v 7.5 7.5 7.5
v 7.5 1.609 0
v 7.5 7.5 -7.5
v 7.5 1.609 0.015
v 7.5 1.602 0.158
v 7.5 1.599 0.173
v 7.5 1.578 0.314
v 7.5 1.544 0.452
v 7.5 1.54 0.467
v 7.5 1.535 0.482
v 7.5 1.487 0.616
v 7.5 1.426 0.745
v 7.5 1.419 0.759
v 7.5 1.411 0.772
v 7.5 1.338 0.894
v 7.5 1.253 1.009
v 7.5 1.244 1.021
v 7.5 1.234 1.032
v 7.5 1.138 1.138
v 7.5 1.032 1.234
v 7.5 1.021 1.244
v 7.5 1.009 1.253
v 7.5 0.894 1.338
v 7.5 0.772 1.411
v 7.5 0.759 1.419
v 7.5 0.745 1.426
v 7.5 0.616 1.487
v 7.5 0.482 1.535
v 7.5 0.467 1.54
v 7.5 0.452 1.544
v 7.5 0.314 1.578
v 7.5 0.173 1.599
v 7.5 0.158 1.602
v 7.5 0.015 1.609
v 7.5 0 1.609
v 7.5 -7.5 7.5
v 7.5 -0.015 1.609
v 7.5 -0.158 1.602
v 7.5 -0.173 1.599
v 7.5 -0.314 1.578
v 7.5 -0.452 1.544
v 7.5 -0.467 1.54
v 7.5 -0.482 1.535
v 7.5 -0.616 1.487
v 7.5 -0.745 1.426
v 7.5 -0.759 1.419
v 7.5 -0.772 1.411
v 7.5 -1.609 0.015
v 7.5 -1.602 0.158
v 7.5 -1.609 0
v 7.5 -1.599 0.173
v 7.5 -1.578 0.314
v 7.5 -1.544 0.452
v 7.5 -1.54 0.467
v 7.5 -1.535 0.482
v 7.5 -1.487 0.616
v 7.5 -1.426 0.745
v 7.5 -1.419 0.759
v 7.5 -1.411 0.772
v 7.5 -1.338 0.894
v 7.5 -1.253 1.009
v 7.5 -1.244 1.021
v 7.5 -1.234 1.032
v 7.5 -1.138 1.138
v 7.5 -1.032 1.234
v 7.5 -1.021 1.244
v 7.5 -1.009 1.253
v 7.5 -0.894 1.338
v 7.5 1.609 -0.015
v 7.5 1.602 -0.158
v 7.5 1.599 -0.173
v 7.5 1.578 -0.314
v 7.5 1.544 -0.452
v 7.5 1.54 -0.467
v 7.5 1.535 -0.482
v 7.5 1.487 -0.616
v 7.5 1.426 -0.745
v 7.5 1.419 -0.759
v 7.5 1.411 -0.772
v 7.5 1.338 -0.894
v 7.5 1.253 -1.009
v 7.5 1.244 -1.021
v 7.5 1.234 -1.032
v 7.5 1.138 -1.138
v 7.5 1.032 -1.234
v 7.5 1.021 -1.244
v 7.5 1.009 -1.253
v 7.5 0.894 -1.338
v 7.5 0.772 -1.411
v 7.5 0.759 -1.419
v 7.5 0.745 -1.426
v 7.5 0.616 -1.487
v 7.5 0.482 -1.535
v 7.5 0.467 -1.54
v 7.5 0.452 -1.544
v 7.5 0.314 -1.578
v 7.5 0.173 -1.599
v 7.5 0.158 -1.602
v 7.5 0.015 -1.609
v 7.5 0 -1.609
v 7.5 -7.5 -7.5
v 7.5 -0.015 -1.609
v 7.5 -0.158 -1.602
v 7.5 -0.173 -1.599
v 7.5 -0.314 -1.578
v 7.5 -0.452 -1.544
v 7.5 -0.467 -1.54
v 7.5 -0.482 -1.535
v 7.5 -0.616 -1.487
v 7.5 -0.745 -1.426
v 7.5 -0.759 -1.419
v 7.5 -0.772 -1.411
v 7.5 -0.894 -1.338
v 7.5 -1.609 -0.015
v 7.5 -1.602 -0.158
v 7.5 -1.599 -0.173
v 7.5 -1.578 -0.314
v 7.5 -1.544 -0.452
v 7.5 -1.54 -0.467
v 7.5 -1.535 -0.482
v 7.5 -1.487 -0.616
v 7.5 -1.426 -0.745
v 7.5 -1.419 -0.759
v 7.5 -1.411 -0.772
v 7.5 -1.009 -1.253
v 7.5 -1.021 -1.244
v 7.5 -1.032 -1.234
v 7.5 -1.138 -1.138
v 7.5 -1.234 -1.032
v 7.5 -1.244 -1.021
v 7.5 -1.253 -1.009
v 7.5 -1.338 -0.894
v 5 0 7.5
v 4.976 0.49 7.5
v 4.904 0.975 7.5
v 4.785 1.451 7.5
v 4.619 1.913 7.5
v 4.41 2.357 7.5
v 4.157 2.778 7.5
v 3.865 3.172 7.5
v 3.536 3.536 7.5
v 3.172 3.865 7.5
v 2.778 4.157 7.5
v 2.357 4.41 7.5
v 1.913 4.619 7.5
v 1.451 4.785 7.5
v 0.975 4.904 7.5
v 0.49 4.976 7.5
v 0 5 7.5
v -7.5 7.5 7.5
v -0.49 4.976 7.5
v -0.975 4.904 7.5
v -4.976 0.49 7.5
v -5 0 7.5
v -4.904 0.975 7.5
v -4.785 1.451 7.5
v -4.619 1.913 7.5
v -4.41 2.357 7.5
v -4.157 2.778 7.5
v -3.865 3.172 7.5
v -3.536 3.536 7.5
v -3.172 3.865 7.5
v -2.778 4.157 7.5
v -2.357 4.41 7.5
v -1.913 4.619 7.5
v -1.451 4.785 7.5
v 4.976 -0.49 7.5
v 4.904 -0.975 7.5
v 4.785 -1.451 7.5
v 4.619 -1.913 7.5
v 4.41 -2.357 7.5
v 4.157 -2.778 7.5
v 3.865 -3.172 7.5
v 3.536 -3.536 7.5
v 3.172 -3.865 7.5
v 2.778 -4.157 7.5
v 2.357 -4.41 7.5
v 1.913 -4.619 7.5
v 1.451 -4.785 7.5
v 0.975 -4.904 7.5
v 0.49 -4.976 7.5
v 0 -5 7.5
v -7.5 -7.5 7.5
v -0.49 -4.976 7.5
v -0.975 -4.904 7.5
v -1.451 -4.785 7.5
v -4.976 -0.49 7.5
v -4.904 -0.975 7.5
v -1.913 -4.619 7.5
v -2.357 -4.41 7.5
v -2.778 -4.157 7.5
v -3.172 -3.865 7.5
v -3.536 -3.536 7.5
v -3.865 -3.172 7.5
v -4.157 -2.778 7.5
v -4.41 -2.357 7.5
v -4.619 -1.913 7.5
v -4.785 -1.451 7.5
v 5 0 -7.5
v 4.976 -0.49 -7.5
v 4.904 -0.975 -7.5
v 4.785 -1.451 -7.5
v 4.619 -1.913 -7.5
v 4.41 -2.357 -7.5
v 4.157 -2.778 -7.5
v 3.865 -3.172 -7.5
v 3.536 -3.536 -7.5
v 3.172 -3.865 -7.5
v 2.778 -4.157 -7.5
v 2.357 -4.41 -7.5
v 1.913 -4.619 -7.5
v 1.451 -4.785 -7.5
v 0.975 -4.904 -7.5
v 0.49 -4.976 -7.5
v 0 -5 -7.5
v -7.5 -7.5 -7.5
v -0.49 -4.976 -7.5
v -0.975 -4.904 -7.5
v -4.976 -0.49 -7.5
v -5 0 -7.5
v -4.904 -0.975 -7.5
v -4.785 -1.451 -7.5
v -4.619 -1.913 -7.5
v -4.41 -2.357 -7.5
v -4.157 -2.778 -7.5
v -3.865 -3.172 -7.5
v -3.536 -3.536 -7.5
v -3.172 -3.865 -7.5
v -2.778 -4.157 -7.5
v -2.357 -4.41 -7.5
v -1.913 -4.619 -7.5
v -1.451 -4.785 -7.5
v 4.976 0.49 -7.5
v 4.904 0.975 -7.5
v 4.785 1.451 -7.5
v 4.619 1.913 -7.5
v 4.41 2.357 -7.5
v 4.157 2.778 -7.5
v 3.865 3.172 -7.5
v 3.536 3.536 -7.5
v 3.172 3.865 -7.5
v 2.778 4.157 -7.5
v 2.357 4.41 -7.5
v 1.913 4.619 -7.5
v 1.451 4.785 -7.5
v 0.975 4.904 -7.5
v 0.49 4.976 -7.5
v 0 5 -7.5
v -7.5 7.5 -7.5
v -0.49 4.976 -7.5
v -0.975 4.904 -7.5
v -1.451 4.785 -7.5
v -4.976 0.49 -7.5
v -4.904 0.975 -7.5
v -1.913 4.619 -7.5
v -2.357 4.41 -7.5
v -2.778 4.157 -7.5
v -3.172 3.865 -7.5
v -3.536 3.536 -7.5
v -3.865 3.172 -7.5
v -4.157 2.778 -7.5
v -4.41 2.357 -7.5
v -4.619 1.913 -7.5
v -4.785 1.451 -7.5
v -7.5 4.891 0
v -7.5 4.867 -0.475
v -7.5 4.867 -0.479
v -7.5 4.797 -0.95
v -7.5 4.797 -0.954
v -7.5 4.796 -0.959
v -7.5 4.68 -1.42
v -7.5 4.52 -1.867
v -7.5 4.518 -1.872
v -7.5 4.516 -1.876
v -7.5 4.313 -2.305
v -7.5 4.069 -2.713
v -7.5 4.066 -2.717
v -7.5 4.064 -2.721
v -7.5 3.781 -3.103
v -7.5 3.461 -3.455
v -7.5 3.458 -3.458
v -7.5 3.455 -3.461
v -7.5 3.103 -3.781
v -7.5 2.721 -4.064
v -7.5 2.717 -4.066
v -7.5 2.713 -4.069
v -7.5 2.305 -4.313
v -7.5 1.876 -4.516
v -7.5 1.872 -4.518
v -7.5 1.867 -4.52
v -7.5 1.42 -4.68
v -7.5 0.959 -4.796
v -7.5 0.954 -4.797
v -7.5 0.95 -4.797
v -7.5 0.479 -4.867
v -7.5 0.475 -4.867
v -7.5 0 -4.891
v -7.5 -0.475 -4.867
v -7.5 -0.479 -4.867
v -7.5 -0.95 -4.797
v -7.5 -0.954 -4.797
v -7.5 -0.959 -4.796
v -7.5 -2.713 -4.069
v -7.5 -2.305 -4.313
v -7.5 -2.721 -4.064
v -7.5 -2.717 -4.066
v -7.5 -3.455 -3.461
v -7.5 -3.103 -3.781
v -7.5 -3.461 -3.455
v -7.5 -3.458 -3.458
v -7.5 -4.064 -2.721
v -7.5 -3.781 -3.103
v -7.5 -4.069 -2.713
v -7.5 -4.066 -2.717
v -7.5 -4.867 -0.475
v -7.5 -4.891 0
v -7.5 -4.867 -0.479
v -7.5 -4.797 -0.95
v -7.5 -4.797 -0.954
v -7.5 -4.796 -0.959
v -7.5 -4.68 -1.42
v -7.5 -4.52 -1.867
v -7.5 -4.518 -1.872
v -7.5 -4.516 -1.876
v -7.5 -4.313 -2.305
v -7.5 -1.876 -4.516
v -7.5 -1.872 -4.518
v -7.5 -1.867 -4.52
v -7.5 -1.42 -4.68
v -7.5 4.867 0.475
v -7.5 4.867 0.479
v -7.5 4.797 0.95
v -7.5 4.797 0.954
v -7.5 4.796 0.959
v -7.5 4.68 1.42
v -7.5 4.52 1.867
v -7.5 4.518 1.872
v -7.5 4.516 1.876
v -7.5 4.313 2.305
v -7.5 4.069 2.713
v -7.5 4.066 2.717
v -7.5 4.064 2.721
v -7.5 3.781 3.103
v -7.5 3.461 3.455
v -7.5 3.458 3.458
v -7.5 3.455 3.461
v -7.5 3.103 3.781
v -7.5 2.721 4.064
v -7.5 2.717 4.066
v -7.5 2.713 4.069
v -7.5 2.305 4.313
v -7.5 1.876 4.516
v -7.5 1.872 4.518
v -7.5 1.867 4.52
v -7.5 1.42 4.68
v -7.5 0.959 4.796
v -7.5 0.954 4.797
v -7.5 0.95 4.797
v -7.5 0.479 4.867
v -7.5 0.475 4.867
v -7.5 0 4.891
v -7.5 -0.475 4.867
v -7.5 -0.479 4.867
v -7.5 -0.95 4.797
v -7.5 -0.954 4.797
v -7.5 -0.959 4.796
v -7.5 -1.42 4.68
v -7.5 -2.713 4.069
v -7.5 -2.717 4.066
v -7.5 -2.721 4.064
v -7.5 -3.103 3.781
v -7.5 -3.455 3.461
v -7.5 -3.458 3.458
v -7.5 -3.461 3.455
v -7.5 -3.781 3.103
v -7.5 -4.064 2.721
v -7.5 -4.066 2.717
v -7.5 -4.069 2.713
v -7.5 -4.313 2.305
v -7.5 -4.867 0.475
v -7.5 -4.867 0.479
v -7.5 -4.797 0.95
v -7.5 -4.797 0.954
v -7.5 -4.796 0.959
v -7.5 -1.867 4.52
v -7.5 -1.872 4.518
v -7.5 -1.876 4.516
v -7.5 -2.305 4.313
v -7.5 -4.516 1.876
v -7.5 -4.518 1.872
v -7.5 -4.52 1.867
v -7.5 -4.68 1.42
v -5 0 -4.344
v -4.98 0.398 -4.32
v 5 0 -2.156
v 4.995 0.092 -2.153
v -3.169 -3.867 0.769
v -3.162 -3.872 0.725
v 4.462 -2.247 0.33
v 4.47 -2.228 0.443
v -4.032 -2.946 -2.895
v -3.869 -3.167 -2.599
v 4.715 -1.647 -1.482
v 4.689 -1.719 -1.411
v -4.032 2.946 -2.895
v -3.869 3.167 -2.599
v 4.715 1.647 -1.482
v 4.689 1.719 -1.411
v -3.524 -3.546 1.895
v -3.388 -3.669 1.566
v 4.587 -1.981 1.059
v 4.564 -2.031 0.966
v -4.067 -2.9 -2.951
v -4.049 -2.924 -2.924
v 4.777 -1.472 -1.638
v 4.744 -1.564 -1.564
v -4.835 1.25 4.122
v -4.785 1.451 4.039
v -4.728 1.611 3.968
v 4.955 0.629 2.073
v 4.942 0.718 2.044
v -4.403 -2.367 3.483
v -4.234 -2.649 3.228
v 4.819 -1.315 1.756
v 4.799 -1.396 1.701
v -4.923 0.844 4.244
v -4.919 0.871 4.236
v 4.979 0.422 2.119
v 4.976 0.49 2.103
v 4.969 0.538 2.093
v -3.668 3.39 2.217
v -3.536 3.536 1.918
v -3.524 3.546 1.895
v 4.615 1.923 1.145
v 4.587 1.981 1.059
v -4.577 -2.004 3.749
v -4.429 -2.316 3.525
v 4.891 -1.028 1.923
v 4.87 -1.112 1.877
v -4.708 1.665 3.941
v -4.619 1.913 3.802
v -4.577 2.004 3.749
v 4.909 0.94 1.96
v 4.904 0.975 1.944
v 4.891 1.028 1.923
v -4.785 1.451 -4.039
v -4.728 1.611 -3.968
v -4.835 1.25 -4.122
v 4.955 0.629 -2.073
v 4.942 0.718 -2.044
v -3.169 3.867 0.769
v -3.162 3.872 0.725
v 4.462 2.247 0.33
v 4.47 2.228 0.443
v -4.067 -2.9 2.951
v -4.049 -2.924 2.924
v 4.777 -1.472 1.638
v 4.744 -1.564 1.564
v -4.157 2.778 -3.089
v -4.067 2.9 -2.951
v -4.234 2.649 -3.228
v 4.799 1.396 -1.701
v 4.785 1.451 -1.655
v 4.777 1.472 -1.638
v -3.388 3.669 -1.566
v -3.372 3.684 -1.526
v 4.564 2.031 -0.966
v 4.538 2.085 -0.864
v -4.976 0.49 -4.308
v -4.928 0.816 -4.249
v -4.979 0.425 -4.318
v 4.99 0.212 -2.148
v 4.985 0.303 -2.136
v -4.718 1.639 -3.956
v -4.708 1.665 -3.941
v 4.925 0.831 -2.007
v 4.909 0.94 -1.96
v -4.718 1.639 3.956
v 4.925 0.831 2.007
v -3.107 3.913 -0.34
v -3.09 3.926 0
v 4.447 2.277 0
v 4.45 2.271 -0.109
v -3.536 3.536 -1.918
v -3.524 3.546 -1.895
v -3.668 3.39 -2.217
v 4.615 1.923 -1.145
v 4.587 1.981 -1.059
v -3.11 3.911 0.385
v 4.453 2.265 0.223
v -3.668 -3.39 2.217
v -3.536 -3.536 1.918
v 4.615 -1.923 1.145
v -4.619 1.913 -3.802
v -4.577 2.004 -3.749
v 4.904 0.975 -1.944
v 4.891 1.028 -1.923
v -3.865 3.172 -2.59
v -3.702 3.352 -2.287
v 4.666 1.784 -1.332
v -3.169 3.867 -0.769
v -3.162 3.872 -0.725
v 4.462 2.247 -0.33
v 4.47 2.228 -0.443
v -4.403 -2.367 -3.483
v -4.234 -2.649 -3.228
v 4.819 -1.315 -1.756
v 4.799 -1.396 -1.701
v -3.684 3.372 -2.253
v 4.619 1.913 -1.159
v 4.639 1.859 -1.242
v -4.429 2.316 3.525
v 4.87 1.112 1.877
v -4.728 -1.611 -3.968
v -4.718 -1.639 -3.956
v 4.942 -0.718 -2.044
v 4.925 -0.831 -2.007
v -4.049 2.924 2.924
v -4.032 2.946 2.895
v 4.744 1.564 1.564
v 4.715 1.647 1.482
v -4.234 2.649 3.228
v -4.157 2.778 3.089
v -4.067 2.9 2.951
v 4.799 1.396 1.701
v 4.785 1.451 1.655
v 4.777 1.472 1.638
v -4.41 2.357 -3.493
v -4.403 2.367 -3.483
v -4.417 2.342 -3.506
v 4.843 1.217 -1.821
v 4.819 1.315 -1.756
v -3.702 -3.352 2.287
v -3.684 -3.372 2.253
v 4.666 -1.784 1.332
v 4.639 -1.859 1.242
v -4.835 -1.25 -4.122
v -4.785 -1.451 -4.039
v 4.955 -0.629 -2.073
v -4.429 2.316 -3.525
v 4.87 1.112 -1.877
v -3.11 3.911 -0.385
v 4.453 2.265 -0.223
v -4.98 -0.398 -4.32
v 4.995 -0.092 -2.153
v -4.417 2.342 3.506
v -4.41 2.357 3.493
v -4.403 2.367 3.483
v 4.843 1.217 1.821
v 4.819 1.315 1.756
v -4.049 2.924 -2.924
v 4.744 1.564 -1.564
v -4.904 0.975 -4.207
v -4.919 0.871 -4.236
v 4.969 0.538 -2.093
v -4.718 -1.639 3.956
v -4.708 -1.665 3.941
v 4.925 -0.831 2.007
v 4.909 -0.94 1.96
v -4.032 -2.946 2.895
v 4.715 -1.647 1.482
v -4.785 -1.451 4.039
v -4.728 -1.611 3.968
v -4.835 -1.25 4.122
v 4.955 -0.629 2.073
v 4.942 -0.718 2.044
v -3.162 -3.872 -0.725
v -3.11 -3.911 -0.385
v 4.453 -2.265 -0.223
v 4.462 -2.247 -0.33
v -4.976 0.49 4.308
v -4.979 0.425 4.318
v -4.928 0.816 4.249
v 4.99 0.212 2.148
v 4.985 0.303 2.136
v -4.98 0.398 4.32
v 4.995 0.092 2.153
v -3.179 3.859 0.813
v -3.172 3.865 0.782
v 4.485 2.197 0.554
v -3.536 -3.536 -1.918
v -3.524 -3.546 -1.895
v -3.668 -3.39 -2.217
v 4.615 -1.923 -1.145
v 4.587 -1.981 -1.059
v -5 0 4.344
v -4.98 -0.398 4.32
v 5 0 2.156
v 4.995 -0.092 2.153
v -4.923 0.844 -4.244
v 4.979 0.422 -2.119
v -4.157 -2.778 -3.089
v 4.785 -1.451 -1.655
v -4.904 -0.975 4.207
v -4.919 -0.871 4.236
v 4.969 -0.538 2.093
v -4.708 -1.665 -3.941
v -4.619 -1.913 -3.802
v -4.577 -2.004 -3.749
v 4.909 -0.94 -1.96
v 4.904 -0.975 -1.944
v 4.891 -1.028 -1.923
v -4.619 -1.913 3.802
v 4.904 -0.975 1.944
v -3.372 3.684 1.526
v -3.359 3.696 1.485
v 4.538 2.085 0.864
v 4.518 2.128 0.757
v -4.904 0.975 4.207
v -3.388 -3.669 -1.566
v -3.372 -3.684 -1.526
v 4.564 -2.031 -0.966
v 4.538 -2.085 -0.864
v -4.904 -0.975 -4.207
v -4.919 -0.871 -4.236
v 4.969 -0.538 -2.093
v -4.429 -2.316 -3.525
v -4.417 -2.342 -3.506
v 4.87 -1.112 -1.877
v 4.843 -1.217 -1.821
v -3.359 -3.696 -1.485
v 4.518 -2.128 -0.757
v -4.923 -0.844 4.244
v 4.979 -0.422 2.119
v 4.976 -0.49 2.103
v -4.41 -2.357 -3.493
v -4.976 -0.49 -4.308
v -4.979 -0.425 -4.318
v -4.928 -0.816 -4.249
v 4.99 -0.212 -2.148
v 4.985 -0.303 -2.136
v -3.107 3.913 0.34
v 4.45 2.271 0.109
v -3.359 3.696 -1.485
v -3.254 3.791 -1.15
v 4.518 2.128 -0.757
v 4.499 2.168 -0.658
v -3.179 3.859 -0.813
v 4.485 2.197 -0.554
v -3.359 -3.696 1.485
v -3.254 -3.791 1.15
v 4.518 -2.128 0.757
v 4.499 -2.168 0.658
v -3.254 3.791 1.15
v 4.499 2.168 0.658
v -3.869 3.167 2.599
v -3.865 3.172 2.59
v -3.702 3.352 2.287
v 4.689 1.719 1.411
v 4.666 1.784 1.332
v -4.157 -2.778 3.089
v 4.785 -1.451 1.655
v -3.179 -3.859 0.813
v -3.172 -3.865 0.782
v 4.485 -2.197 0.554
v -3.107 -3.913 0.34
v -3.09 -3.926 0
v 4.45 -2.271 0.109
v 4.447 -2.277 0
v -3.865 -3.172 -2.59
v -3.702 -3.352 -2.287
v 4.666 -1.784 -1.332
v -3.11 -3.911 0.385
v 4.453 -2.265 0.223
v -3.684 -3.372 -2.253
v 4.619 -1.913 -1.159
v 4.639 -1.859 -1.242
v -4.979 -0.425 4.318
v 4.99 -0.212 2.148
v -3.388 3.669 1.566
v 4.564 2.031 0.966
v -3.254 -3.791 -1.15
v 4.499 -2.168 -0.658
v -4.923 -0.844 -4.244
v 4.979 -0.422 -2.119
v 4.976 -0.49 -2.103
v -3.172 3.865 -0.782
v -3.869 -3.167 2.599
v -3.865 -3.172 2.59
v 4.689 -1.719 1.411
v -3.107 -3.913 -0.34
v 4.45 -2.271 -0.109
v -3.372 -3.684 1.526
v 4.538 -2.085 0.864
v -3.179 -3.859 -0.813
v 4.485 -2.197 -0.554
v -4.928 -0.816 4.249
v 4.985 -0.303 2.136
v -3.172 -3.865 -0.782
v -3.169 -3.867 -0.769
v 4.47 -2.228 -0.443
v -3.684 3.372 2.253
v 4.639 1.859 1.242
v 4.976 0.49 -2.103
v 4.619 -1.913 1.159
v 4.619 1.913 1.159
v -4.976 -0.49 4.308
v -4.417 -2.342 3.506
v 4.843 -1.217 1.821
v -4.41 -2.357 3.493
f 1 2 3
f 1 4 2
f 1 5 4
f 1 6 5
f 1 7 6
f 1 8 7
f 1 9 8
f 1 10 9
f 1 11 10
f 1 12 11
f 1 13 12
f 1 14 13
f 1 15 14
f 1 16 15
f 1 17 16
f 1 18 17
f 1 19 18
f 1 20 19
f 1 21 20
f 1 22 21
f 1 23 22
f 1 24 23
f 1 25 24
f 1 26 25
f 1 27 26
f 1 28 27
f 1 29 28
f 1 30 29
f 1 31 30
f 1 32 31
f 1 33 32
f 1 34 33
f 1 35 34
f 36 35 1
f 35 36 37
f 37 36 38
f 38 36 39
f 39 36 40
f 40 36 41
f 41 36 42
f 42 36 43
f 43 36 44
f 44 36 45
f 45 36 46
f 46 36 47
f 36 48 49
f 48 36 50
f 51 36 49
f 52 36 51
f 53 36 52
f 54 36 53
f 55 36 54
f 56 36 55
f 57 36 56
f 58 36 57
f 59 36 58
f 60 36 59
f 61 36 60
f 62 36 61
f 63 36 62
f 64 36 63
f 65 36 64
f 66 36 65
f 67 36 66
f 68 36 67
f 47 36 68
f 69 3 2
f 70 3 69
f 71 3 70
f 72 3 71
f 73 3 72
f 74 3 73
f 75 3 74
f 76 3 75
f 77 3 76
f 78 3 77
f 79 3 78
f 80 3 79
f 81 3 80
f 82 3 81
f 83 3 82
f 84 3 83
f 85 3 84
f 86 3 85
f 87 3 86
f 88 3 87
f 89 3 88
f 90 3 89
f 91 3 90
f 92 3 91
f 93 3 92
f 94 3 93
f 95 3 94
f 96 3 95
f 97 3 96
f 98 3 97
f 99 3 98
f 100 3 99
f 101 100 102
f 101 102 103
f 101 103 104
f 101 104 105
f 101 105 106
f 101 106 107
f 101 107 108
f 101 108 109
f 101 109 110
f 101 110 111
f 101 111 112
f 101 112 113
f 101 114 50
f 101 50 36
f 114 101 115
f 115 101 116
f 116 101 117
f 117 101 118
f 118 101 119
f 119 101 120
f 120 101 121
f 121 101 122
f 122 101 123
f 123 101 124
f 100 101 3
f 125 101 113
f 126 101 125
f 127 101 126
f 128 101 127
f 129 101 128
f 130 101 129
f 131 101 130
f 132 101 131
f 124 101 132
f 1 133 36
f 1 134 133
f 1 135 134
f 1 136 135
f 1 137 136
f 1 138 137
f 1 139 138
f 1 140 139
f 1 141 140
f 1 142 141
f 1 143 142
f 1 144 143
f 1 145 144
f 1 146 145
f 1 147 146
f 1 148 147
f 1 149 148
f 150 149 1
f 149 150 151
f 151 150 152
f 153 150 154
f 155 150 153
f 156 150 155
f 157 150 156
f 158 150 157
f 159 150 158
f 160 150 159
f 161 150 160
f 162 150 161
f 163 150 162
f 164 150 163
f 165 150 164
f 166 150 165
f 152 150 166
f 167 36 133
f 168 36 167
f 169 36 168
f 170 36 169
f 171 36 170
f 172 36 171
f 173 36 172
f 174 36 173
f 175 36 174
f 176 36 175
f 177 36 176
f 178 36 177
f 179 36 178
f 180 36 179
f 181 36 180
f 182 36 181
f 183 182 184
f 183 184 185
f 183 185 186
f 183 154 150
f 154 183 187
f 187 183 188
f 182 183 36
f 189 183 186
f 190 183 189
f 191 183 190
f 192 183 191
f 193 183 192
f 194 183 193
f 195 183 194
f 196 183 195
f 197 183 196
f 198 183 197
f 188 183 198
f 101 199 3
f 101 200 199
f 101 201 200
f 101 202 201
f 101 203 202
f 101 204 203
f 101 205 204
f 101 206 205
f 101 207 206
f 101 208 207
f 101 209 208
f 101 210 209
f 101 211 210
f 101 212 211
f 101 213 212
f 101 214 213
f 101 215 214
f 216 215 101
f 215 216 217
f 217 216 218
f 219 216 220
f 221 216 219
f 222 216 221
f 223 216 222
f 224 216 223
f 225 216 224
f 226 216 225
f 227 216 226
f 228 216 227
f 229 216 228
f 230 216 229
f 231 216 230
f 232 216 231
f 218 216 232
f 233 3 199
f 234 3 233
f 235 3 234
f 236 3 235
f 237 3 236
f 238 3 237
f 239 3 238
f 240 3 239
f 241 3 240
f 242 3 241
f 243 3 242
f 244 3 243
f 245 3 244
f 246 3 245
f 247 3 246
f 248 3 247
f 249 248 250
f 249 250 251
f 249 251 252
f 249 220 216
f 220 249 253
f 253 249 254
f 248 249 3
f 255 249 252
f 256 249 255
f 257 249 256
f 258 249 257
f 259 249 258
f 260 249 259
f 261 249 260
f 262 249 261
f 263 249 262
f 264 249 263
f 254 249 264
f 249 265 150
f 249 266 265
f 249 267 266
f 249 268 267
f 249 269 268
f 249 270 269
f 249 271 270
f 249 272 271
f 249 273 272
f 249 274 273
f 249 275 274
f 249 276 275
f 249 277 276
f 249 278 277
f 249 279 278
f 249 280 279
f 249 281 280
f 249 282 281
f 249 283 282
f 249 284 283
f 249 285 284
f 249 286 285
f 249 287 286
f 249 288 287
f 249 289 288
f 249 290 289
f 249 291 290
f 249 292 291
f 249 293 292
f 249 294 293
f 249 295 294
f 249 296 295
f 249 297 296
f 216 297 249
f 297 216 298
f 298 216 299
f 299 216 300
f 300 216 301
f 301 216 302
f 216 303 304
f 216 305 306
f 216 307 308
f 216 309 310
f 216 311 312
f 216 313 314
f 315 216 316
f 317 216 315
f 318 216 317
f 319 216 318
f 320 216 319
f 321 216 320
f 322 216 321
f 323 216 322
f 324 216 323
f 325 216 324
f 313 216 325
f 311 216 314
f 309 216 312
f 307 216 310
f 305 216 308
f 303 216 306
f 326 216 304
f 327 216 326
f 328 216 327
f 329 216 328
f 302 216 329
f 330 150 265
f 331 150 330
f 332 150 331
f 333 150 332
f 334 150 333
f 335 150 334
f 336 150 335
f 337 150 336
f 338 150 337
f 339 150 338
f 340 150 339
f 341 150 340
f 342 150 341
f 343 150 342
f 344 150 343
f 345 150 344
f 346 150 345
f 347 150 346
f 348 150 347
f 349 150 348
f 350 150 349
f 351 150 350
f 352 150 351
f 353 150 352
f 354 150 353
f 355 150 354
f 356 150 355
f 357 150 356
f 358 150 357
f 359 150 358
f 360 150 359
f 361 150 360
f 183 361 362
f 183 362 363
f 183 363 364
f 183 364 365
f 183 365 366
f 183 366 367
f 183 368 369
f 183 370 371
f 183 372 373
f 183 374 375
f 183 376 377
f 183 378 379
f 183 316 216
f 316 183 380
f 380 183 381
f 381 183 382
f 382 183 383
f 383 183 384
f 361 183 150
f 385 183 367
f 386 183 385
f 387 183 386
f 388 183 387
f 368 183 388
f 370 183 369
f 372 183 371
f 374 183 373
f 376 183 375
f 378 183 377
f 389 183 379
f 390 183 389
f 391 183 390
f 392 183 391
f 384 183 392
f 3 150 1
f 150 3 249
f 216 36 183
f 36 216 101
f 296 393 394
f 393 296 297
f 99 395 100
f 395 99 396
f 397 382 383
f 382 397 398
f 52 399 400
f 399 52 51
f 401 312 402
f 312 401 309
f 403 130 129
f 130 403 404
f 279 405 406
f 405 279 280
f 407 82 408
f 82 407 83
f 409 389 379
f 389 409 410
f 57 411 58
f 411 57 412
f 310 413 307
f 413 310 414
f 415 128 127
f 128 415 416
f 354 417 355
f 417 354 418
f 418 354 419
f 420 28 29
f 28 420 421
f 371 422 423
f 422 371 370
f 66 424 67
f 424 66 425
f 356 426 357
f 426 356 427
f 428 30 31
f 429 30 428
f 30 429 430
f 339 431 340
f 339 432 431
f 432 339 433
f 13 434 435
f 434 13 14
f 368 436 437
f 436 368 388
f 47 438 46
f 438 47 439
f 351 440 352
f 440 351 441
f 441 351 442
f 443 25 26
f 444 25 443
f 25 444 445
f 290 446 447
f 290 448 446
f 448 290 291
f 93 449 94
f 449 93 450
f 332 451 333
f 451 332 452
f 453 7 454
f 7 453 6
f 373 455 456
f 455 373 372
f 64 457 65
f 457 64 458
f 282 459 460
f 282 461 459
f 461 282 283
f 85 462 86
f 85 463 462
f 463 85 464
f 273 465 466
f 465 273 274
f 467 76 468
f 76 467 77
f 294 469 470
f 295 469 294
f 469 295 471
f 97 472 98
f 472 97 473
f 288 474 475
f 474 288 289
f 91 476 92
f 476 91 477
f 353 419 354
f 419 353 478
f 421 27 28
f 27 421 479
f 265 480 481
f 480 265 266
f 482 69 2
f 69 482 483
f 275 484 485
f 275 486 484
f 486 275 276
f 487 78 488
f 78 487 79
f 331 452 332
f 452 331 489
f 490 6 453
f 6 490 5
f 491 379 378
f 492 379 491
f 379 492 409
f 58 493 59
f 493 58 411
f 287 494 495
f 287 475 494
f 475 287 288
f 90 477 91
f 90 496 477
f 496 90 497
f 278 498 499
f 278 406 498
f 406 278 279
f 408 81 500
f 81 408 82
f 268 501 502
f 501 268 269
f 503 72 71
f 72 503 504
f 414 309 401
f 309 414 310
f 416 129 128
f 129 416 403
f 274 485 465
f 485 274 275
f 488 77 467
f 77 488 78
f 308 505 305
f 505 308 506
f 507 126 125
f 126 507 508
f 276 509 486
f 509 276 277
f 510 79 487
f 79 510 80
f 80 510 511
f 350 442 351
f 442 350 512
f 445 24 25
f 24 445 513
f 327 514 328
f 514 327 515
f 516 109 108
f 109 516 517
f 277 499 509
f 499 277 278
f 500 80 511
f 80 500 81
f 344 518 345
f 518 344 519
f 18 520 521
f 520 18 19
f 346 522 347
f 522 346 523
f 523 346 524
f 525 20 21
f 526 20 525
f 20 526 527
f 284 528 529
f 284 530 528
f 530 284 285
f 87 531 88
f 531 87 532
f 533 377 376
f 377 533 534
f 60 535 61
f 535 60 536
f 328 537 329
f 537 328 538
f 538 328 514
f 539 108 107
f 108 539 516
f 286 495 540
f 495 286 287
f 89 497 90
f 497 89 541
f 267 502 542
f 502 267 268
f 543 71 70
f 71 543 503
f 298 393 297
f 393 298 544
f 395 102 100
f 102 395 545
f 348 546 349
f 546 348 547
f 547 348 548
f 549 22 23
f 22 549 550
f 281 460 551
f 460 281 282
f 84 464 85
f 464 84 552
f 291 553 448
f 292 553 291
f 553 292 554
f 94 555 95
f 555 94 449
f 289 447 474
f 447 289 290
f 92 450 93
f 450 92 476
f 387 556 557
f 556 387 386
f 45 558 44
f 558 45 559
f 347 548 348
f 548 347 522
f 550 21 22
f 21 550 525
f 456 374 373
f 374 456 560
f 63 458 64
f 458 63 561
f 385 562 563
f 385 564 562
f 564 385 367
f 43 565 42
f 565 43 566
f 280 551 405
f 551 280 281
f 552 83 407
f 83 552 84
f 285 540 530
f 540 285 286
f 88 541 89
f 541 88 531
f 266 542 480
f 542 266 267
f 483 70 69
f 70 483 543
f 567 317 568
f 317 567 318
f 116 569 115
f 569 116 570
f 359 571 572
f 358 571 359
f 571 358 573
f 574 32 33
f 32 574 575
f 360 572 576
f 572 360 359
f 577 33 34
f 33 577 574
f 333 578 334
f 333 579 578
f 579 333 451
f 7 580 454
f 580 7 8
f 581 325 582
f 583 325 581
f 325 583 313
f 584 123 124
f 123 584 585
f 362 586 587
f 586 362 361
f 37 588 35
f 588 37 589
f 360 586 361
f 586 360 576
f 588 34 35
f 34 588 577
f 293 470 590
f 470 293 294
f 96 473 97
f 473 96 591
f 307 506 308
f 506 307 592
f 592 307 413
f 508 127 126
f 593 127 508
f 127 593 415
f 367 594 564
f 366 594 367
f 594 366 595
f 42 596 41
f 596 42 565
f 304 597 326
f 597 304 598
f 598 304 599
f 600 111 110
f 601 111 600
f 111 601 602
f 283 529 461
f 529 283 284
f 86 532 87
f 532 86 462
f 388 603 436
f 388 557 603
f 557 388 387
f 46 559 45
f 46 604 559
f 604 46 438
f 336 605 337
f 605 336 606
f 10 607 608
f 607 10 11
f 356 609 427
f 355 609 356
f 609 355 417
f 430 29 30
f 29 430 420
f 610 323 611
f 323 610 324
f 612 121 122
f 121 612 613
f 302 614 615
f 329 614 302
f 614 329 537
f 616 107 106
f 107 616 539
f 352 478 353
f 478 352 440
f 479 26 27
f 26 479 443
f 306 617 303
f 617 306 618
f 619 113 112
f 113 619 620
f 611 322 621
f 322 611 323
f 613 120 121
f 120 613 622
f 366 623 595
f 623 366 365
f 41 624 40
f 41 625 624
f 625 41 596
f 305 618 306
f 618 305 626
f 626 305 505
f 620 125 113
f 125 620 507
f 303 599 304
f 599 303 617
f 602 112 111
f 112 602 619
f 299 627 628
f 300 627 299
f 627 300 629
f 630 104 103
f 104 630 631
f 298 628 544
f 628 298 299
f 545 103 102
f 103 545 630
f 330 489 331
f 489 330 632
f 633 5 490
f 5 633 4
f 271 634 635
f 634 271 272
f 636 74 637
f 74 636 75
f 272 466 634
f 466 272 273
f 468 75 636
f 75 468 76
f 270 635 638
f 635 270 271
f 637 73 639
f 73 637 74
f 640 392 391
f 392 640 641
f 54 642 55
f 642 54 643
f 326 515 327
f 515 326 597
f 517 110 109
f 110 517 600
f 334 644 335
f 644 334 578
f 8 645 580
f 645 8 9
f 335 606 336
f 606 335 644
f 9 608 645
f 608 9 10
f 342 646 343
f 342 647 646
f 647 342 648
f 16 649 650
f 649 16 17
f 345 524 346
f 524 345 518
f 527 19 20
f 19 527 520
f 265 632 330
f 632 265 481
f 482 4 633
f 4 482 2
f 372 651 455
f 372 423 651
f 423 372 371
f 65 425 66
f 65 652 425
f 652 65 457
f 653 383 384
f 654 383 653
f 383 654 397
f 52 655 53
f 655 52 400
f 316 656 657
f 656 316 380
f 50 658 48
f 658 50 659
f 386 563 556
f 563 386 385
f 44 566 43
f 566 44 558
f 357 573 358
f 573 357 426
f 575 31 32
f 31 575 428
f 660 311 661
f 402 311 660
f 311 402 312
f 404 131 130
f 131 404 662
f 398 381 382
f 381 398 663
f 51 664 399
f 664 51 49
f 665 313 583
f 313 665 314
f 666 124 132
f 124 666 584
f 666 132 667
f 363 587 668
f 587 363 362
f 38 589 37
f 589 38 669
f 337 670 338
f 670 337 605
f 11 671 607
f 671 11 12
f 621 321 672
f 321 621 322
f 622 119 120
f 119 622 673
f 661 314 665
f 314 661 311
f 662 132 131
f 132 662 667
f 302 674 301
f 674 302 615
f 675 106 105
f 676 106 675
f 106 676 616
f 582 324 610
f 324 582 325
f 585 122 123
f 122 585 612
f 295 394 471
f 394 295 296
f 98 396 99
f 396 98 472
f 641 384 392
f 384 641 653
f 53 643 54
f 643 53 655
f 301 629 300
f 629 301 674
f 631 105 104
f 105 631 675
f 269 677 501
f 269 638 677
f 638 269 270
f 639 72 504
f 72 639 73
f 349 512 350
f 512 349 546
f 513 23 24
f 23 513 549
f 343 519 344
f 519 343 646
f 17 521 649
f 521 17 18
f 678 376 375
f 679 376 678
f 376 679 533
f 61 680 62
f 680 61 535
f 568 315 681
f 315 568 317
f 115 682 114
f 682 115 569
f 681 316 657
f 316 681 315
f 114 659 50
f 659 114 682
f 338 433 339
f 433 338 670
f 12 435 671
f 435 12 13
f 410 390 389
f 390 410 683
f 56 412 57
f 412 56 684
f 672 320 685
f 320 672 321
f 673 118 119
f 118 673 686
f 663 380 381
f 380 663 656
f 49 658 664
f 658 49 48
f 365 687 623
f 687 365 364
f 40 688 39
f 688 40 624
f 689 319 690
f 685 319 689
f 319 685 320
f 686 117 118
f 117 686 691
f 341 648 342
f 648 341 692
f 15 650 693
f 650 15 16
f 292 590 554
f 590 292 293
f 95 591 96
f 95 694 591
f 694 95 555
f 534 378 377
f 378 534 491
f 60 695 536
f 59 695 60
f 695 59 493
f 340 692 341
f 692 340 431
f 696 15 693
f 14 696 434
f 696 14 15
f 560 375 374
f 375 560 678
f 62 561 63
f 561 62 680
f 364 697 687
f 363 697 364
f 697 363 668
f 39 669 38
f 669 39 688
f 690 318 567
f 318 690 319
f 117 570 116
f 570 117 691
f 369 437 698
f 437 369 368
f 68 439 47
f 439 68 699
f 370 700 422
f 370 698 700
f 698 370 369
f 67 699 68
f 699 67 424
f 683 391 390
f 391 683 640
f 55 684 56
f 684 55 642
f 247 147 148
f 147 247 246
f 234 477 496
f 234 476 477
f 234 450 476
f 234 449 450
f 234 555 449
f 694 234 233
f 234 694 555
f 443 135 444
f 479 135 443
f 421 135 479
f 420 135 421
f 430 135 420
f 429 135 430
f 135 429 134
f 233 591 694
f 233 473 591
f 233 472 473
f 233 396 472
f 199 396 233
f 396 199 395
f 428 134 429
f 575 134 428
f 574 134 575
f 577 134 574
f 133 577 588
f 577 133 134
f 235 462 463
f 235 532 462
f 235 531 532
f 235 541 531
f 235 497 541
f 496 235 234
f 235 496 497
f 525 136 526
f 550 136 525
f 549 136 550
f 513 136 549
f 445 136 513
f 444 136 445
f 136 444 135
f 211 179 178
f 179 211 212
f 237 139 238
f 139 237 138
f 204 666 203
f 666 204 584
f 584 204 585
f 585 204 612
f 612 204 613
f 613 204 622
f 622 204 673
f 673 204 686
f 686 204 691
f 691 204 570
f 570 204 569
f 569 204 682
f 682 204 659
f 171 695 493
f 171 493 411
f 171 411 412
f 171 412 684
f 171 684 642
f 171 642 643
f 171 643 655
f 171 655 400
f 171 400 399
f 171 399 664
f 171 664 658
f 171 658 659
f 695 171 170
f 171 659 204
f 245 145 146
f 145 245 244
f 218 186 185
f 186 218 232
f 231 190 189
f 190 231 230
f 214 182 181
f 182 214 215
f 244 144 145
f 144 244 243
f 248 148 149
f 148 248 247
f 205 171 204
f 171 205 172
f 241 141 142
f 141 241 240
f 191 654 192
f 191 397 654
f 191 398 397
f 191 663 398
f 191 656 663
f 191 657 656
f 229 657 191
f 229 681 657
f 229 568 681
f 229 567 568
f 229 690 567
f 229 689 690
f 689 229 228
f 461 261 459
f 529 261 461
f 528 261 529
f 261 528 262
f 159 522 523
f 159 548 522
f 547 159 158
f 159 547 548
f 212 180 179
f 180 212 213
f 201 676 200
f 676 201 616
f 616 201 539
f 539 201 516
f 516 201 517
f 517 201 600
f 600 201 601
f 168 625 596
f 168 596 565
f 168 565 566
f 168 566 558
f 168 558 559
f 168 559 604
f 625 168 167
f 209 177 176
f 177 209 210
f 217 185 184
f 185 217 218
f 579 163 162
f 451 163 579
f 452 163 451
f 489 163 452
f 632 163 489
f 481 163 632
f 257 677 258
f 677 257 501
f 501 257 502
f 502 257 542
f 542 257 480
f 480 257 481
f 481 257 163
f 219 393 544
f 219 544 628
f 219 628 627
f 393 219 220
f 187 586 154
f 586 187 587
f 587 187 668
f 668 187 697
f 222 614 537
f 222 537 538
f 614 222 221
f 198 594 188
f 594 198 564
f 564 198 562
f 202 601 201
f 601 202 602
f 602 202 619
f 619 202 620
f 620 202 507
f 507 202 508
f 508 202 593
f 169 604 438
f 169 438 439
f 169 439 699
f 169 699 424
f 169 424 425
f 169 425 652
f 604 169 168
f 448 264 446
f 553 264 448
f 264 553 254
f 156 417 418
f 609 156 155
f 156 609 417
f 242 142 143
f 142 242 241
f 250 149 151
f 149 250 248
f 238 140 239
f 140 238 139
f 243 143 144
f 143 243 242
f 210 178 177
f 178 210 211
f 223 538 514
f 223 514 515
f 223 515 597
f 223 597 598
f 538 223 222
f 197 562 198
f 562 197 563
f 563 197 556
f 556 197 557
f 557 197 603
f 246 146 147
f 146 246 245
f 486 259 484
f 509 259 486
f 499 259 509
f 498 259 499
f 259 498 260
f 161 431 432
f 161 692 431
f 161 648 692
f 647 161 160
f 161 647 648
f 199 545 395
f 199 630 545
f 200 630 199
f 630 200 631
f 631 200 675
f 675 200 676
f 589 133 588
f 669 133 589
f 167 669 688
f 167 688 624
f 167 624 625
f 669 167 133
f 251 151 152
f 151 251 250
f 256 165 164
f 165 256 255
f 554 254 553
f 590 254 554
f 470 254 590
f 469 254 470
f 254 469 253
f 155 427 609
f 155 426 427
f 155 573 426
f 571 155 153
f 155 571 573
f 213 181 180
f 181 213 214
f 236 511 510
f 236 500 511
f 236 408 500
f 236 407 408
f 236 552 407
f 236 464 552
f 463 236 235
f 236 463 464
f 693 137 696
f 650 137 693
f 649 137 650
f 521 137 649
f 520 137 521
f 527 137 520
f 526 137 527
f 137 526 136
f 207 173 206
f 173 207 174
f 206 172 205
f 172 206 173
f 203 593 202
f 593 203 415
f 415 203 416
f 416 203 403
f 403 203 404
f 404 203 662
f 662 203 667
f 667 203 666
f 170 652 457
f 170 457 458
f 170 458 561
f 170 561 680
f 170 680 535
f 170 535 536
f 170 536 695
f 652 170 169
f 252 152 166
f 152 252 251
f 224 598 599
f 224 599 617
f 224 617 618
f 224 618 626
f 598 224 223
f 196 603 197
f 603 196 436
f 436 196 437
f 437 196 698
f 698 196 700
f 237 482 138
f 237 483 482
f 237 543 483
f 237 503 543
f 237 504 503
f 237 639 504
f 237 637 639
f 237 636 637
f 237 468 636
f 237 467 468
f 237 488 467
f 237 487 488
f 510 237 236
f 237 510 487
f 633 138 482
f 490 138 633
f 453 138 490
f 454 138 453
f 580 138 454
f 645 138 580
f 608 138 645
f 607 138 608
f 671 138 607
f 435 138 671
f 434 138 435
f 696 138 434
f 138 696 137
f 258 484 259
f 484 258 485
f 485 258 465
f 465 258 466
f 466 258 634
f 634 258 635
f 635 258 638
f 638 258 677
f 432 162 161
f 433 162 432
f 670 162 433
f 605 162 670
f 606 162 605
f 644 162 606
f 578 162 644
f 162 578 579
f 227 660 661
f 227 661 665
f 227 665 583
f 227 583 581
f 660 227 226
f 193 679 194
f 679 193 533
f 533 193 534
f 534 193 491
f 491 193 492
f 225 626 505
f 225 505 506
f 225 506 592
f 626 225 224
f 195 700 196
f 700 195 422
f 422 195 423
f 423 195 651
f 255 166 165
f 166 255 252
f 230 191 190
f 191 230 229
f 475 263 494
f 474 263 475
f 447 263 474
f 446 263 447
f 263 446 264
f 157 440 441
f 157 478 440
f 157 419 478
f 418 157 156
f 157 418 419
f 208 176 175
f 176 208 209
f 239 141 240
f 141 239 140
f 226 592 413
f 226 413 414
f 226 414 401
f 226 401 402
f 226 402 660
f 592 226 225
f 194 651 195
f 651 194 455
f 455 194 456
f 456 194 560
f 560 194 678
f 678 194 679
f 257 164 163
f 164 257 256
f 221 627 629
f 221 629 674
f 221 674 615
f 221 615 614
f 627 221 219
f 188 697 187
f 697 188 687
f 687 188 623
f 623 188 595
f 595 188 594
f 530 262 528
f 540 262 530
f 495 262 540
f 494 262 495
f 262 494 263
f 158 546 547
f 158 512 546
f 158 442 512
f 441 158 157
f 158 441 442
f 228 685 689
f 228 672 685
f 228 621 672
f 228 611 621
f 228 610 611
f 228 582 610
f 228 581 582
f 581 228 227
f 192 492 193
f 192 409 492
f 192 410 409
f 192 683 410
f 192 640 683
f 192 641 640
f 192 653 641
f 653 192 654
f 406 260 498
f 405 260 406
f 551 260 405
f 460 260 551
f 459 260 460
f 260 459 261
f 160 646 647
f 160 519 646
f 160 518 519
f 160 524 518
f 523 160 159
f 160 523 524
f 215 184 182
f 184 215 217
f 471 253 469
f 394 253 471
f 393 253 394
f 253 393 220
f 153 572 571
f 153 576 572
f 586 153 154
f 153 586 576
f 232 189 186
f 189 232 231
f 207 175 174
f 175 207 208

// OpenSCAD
module ccube(s=15) {
    difference() {
        cube([s, s, s], center=true);
        # rotate([0, 90, 0])
            cylinder(r1=s/3, r2=s/10, h=s+1, center=true, $fn=64);
        cylinder(r=s/3, h=2*s, center=true, $fn=64);
    }
}

ccube();
